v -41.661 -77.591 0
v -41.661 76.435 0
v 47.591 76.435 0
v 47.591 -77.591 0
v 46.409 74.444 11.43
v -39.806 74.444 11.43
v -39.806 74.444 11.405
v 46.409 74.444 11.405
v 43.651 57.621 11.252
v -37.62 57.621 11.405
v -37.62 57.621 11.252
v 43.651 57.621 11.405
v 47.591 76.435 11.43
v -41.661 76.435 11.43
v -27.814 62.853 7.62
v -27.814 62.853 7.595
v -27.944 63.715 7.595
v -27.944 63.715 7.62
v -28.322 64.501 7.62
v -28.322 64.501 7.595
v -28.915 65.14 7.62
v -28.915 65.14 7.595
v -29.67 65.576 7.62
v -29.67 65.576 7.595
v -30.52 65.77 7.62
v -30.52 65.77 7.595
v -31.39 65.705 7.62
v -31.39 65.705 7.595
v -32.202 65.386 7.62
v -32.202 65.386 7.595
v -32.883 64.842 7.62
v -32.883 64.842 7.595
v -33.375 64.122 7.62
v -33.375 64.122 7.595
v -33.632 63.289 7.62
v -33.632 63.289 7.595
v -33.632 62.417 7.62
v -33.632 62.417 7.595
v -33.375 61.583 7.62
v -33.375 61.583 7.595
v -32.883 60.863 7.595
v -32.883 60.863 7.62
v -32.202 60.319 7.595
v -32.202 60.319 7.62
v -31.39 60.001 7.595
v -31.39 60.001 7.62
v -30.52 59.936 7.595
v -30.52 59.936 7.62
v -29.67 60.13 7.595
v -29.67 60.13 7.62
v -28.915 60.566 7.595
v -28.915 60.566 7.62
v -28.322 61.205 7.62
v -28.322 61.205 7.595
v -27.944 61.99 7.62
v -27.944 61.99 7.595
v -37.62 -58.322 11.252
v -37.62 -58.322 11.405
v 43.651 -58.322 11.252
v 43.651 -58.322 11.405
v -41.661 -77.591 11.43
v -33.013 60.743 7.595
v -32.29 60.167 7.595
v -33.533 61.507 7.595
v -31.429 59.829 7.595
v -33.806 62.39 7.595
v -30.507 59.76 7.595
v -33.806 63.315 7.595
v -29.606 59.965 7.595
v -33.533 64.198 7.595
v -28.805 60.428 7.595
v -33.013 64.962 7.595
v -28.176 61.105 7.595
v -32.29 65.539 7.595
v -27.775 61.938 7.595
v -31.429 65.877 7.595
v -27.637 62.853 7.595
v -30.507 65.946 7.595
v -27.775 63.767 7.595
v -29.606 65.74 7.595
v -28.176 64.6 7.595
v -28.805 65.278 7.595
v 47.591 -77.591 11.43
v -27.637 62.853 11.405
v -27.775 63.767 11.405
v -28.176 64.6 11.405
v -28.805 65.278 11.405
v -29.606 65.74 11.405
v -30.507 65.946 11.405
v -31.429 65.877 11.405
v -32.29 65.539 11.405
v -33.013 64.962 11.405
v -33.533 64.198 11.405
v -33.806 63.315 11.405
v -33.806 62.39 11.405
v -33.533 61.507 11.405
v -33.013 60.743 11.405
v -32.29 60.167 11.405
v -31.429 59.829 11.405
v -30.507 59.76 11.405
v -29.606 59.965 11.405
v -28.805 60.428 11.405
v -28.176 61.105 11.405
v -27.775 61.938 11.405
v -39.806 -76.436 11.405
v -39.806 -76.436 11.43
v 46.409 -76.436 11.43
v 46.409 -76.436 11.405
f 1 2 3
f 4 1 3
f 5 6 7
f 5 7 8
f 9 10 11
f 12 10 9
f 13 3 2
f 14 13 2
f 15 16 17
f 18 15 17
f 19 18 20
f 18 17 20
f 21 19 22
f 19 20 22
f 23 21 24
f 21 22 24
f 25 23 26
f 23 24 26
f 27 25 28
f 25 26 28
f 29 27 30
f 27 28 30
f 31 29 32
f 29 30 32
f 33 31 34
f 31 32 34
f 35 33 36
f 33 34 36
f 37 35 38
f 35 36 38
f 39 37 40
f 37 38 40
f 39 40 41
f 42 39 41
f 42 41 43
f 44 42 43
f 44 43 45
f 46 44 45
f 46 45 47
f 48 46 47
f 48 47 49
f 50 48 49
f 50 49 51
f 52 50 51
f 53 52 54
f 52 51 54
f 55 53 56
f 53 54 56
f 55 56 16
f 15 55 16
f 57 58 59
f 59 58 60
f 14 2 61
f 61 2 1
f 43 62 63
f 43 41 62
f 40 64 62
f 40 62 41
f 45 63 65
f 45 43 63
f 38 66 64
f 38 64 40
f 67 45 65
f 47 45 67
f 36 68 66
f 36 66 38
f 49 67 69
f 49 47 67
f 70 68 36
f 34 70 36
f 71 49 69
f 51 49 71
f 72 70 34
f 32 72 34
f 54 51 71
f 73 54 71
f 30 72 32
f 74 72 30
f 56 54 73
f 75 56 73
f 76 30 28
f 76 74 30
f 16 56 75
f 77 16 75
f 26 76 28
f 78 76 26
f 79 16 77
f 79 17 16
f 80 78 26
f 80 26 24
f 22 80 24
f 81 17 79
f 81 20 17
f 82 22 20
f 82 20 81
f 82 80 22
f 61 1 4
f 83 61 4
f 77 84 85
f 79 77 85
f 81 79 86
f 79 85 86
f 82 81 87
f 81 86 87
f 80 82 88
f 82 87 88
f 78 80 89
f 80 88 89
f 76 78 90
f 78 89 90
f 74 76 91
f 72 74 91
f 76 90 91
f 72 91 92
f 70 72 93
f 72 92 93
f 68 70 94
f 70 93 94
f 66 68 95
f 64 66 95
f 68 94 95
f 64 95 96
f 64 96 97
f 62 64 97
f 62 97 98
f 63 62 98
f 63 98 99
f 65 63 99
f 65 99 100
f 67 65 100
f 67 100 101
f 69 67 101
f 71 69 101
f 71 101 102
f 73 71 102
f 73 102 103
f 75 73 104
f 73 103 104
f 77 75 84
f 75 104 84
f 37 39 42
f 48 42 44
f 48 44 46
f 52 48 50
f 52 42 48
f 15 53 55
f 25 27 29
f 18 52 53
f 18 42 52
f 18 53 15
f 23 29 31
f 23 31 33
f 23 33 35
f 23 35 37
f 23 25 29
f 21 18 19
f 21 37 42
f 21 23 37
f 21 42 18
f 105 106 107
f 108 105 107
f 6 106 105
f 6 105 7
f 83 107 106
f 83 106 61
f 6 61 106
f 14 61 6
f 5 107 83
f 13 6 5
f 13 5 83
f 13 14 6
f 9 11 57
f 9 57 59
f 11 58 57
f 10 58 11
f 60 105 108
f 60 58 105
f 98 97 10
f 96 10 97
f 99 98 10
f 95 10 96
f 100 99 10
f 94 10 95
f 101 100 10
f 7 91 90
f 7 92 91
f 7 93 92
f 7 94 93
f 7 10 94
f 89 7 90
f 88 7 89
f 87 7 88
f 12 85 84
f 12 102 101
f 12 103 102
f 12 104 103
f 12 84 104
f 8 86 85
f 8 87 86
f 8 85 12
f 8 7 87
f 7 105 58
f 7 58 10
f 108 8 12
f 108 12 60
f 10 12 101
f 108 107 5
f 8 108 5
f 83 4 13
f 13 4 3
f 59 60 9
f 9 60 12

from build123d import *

# Parameters (mm, degrees)
F1_DEPTH = 11.43
F2_W     = 81.271418
F2_H     = 115.942701
F3_DEPTH = 0.1778
F4_W     = 86.214885
F4_H     = 150.880255
F5_DEPTH = 0.0254
F6_R     = 3.101618
F7_DEPTH = 3.81
F8_R     = 2.925267
F9_DEPTH = 0.0254


with BuildPart() as f1:
    # F0 (on Top) → F1 (new body)
    with BuildSketch(Plane.XY):
        Polygon((47.590654, 76.434568), (0, 76.434568), (-41.661378, 76.434568), (-41.661378, 0), (-41.661378, -76.72172), (-41.661378, -77.591054), (0, -77.591054), (47.590654, -77.591054), align=None)
    extrude(amount=F1_DEPTH)

    # F2 (on face) → F3 (cut)
    with BuildSketch(Plane.XY.offset(11.43)):
        with Locations((3.015559, -0.350732)):
            Rectangle(F2_W, F2_H)
    extrude(amount=-F3_DEPTH, mode=Mode.SUBTRACT)

    # F4 (on face) → F5 (cut)
    with BuildSketch(Plane.XY.offset(11.43)):
        with Locations((3.301713, -0.995736)):
            Rectangle(F4_W, F4_H)
    extrude(amount=-F5_DEPTH, mode=Mode.SUBTRACT)

    # F6 (on face) → F7 (cut)
    with BuildSketch(Plane.XY.offset(11.4046)):
        with Locations((-30.738983, 62.852658)):
            Circle(F6_R)
    extrude(amount=-F7_DEPTH, mode=Mode.SUBTRACT)

    # F8 (on face) → F9 (join)
    with BuildSketch(Plane.XY.offset(7.5946)):
        with Locations((-30.738983, 62.852658)):
            Circle(F8_R)
    extrude(amount=F9_DEPTH)


solid = f1.part
